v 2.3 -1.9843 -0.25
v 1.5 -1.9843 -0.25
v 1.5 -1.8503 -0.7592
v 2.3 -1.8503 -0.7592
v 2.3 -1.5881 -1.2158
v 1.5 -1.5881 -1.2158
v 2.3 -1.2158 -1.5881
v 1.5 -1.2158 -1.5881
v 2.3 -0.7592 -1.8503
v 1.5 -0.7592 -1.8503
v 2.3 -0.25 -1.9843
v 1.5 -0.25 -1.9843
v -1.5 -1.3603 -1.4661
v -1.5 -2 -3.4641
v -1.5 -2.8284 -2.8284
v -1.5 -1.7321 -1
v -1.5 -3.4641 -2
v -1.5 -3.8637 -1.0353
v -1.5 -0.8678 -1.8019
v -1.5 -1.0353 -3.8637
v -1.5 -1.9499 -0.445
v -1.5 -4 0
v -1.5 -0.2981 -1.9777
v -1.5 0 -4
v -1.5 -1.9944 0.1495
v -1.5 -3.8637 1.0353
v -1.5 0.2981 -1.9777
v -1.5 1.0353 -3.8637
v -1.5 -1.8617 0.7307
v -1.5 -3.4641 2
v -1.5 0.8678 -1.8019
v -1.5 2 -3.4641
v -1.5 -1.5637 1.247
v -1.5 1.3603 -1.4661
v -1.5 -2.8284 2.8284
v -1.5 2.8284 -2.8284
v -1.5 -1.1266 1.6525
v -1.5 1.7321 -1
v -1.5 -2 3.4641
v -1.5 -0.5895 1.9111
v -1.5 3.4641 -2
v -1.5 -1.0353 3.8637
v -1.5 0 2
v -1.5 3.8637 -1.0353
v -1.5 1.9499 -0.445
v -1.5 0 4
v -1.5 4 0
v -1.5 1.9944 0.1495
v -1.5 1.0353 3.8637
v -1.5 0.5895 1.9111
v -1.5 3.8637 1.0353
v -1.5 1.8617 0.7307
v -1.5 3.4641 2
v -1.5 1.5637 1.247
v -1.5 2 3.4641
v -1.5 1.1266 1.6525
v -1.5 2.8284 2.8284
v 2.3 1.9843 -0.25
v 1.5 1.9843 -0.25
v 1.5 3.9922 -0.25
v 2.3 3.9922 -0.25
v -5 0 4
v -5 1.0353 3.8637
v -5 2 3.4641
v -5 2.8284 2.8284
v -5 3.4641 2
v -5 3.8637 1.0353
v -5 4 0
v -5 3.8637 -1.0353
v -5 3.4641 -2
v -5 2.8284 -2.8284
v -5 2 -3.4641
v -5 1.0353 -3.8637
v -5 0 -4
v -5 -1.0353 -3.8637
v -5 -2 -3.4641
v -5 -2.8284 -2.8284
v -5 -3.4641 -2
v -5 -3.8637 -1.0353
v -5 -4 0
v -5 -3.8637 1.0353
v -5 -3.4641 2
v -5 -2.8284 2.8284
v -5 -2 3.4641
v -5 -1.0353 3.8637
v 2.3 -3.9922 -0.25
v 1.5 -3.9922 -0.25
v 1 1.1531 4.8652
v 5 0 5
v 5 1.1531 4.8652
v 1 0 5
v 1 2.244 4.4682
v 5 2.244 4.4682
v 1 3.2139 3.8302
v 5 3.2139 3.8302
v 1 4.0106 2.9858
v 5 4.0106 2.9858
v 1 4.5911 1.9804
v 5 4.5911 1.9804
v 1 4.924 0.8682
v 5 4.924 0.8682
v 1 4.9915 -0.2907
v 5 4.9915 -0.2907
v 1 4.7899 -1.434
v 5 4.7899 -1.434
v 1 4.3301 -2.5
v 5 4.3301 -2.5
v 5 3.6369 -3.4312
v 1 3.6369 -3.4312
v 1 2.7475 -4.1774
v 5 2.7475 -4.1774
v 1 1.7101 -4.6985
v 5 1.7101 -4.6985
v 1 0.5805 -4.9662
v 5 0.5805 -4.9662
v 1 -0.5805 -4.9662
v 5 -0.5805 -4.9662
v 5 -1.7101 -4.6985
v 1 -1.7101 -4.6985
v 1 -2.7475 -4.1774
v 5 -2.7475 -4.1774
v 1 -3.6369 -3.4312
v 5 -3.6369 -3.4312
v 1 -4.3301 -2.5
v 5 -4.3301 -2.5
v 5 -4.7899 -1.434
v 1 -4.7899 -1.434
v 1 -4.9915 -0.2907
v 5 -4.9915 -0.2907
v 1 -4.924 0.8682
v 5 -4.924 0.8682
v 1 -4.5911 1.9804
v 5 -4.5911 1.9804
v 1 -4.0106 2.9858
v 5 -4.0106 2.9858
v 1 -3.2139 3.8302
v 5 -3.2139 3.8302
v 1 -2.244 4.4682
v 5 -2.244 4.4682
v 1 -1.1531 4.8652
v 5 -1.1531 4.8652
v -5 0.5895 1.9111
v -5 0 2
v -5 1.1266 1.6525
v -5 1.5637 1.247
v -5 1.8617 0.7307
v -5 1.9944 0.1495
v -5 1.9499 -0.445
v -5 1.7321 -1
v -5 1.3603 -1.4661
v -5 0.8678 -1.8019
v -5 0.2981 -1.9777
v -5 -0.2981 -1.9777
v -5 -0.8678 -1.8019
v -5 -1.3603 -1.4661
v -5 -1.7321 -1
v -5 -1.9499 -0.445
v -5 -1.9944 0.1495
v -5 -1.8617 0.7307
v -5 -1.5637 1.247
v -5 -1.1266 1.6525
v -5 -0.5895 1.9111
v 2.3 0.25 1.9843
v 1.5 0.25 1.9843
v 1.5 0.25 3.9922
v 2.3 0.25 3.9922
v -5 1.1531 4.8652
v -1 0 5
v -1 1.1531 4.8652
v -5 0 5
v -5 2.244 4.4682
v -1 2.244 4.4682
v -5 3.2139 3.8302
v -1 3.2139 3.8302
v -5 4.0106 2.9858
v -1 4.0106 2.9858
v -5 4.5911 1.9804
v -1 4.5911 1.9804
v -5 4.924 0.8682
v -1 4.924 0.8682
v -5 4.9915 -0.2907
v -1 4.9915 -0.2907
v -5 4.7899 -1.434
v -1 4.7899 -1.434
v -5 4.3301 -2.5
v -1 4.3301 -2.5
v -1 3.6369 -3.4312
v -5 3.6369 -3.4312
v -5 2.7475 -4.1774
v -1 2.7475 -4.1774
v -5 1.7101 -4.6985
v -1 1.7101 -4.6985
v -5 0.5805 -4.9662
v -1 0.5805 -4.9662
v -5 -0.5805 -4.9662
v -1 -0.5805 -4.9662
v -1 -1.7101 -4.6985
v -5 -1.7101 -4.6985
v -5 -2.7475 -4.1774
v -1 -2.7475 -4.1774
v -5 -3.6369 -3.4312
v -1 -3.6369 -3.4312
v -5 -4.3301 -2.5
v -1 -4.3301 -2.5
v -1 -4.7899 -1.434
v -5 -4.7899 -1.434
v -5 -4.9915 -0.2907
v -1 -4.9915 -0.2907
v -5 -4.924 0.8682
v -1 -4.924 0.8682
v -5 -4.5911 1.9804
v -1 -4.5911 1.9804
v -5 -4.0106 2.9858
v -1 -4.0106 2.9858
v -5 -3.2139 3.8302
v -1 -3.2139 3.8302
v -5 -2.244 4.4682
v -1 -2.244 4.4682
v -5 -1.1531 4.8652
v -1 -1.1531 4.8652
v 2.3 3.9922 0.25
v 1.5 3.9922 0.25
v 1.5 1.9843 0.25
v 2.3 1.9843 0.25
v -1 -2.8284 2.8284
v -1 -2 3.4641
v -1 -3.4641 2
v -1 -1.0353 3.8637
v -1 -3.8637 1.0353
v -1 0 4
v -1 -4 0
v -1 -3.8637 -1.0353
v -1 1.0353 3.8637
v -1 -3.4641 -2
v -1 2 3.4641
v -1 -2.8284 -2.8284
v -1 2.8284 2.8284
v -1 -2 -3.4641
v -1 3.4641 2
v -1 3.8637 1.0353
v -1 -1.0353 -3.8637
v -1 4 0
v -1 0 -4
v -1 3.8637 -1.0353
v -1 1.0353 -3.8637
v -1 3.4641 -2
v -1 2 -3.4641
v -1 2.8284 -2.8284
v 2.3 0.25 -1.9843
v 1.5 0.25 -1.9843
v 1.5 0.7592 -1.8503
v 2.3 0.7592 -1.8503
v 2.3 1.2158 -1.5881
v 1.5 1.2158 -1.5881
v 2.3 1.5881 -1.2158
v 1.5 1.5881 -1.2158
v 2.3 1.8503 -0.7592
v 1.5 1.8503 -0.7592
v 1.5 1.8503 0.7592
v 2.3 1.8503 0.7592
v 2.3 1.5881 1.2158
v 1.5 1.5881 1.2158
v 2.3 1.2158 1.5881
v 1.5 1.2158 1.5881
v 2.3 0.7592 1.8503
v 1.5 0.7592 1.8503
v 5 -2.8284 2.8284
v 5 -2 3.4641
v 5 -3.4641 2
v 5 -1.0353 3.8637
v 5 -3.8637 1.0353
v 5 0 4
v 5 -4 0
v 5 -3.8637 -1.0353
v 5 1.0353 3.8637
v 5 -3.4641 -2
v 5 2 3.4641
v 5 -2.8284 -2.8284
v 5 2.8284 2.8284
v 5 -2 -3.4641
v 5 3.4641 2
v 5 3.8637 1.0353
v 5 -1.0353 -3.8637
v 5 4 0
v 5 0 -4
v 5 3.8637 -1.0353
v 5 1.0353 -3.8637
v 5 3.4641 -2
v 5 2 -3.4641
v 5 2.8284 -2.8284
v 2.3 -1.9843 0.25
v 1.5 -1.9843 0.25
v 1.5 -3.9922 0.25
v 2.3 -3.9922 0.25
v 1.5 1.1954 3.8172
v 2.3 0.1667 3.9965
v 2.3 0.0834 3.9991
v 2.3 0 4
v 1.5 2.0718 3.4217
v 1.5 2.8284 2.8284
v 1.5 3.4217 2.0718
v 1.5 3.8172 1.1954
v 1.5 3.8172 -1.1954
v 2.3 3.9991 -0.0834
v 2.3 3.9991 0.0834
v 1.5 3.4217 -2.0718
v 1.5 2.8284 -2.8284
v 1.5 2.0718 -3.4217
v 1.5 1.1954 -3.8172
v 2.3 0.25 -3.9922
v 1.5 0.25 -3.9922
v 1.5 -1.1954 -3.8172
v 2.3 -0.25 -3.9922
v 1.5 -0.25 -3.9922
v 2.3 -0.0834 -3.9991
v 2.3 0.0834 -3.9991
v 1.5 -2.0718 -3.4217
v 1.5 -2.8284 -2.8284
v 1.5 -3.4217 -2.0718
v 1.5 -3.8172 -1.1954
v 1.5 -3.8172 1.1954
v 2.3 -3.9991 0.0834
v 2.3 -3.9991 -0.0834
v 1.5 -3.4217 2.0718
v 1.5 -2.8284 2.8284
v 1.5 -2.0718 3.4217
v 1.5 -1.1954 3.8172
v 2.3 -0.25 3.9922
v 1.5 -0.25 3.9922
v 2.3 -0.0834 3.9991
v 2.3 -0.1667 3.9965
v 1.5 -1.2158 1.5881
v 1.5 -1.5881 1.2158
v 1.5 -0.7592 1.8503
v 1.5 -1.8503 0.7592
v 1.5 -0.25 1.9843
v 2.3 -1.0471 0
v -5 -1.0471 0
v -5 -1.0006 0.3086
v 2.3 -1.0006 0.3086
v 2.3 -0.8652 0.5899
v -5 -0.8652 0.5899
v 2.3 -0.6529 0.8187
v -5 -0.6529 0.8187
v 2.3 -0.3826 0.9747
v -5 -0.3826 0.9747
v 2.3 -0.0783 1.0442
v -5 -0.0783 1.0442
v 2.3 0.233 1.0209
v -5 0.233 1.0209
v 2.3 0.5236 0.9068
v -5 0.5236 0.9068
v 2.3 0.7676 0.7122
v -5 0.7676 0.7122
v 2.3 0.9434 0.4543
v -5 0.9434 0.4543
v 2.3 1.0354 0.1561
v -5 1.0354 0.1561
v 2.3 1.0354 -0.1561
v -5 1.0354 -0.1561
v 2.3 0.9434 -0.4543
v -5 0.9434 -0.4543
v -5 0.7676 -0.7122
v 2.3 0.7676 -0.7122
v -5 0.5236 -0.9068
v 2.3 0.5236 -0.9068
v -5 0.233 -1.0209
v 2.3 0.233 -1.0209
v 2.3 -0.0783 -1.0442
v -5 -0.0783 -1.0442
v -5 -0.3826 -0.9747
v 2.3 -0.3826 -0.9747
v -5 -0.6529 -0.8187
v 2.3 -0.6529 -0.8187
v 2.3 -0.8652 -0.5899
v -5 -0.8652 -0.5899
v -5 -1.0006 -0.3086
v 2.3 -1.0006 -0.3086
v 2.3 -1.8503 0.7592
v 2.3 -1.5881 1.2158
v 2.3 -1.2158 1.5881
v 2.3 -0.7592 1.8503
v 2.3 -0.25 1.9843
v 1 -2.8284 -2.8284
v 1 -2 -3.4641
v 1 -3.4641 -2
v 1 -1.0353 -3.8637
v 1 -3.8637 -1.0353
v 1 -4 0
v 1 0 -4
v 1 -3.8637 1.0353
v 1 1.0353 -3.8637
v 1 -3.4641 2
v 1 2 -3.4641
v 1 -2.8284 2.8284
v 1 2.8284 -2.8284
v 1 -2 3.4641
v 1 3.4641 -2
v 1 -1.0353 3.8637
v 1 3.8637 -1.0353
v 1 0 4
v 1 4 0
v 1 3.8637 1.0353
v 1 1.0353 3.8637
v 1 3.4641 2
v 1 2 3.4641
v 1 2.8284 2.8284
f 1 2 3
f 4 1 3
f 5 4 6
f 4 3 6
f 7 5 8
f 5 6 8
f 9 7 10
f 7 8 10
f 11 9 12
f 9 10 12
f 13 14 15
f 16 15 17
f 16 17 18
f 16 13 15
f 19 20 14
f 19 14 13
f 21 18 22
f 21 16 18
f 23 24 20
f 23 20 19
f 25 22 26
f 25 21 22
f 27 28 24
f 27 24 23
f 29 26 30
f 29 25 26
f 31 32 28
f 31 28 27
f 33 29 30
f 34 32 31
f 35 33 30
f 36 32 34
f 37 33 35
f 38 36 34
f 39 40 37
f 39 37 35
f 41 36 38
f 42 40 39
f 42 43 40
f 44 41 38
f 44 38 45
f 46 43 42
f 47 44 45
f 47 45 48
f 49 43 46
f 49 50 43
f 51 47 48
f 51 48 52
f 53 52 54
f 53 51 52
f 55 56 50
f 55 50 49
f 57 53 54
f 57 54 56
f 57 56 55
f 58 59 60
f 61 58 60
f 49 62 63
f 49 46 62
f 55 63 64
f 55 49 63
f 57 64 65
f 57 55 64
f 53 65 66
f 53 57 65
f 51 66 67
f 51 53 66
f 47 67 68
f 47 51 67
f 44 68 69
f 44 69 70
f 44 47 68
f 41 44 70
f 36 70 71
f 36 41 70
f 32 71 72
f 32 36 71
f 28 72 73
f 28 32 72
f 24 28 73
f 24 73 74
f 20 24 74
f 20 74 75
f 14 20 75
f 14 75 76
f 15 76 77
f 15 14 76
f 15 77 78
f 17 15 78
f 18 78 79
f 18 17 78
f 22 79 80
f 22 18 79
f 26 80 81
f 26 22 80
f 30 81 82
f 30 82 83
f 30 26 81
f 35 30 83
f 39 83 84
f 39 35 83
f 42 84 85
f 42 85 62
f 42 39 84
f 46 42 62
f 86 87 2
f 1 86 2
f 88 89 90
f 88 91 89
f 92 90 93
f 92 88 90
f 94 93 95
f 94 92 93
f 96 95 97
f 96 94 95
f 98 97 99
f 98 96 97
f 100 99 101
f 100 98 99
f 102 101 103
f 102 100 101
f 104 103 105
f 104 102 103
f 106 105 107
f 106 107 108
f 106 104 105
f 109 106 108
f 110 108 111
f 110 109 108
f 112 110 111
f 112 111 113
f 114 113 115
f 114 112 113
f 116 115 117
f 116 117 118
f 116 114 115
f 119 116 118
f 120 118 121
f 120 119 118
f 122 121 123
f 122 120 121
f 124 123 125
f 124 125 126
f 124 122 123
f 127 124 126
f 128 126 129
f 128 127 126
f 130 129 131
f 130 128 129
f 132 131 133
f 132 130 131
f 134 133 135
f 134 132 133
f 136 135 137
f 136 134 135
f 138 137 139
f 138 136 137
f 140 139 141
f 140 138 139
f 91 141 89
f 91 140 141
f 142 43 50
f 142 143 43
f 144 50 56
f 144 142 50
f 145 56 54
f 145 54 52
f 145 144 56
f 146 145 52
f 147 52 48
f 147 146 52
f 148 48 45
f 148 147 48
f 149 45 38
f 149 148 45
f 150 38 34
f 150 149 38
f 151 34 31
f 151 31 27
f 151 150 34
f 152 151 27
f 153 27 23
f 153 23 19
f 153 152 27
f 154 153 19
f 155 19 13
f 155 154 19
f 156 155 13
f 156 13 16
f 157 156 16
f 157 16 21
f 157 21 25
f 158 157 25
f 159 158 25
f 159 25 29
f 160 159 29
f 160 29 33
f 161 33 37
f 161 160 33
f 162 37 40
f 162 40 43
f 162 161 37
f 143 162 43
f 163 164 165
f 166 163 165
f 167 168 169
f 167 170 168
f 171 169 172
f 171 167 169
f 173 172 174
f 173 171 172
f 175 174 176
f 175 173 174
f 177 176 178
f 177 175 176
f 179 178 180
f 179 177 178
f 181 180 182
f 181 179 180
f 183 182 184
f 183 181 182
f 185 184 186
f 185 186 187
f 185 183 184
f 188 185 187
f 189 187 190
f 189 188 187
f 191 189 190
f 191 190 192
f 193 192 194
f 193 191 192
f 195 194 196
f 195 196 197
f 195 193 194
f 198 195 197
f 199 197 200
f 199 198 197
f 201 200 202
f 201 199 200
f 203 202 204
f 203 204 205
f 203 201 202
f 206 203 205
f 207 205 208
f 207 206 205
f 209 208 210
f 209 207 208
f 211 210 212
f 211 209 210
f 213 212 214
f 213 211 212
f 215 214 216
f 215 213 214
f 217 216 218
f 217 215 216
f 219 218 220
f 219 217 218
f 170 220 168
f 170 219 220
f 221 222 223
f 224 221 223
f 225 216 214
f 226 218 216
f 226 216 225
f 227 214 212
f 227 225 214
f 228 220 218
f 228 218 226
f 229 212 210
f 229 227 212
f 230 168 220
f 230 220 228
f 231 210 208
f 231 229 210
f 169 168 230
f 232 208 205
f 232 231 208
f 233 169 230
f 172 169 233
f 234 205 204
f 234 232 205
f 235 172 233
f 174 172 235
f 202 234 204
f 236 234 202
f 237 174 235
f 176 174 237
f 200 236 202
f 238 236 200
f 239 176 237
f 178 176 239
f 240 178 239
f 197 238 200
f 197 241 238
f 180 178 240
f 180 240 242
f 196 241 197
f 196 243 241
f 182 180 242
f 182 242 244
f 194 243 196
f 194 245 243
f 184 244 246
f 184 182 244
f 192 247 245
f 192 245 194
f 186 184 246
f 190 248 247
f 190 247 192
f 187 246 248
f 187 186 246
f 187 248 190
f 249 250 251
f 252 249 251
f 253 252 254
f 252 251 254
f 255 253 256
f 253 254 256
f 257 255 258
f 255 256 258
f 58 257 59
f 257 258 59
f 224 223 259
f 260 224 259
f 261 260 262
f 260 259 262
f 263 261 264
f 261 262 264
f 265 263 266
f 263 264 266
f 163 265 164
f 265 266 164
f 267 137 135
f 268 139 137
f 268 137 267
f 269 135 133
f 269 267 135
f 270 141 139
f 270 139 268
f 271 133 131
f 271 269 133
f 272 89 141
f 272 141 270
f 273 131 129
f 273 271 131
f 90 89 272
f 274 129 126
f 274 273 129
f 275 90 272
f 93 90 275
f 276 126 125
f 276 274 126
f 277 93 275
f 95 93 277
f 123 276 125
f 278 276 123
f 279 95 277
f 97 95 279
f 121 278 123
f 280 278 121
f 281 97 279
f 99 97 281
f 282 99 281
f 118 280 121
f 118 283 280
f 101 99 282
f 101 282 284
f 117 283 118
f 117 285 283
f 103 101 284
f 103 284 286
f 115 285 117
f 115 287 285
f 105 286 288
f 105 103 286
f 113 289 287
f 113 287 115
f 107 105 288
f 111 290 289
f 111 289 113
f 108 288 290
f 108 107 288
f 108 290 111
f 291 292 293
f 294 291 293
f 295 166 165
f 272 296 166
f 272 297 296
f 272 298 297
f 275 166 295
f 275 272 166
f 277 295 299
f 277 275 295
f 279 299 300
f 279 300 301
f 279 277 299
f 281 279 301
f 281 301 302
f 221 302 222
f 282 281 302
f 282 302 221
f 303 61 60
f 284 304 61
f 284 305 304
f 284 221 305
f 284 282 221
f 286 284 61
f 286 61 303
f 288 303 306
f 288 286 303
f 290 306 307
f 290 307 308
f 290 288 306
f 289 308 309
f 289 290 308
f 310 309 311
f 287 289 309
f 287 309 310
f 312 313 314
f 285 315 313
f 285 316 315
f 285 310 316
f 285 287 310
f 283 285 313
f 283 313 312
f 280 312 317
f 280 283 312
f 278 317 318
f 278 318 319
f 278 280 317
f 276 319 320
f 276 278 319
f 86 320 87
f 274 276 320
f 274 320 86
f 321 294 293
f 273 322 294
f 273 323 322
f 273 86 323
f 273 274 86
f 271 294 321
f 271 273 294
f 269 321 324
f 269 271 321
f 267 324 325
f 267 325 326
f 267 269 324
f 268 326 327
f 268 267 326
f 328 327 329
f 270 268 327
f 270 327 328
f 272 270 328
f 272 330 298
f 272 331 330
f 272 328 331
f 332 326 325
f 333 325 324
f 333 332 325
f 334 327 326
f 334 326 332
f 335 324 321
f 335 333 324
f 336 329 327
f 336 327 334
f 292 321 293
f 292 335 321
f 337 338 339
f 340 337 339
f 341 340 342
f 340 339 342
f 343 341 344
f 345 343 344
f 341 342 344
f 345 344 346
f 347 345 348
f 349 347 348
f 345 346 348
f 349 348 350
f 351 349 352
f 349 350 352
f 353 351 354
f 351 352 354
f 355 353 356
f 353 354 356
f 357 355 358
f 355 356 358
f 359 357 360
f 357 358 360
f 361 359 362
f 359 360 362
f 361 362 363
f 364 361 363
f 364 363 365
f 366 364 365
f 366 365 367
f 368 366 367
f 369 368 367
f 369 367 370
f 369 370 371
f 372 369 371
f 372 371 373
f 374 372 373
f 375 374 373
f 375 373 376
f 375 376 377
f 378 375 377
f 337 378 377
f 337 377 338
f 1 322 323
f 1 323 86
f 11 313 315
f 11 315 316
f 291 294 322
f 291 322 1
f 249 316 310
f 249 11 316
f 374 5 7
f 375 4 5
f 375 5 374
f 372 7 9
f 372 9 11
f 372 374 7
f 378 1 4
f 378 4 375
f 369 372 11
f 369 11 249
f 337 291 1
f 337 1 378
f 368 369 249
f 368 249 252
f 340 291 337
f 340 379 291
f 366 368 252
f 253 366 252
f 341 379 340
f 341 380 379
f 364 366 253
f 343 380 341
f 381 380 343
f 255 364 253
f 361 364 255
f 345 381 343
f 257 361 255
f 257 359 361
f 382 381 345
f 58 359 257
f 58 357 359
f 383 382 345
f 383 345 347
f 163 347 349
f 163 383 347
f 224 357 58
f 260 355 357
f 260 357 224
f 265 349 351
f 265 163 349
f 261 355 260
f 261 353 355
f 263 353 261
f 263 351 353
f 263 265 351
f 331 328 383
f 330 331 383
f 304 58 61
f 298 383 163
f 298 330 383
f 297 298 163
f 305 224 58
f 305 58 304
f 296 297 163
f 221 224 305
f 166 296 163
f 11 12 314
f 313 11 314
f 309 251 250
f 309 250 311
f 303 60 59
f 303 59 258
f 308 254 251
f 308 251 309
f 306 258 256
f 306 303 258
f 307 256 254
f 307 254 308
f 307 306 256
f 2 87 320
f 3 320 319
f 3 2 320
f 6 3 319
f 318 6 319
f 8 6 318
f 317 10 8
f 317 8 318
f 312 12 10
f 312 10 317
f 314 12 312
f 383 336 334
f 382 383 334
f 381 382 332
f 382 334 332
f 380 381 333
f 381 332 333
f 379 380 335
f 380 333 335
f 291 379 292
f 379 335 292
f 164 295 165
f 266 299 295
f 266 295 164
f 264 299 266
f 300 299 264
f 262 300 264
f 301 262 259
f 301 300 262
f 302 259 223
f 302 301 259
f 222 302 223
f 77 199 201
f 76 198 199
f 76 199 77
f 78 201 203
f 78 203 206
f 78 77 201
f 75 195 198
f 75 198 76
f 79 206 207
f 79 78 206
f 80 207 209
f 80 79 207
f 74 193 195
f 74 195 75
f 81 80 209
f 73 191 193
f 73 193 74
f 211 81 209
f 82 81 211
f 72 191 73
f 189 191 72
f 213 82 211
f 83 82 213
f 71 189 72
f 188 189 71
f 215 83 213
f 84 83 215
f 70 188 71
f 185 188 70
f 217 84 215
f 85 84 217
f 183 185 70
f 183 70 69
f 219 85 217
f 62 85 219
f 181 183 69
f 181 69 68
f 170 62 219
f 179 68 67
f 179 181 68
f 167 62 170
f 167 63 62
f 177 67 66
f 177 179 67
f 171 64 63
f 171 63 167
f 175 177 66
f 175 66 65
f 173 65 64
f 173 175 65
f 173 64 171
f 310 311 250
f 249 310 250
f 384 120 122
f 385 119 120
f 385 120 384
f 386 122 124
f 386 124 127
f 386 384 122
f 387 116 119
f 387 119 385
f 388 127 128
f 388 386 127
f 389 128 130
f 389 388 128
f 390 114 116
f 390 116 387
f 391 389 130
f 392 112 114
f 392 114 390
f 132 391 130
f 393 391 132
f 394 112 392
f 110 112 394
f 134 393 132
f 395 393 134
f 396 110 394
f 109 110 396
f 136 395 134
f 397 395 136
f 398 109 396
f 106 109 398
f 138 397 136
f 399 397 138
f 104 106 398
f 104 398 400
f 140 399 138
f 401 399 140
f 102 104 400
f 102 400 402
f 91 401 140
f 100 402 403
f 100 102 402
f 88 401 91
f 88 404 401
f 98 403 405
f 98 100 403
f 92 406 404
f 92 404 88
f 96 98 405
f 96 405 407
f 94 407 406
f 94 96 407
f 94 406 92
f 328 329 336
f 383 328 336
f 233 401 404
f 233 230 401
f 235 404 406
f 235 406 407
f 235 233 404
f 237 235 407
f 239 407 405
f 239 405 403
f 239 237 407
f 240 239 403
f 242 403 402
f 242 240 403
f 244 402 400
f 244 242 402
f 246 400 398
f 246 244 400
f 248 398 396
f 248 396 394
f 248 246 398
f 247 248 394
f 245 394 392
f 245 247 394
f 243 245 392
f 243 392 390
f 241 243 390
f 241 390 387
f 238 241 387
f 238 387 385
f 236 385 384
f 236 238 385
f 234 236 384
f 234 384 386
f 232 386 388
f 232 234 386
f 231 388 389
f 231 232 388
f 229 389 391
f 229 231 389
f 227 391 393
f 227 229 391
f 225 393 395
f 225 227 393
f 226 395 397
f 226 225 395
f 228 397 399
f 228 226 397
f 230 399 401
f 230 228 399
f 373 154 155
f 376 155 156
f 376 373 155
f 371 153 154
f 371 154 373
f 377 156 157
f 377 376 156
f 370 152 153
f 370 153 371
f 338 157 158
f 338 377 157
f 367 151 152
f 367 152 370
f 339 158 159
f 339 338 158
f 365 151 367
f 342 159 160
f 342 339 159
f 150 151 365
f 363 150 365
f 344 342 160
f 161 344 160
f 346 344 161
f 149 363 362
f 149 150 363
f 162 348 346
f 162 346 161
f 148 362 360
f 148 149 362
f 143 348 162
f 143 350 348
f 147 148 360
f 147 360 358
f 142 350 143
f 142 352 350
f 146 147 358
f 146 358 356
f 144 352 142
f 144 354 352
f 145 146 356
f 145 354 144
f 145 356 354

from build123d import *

# Parameters (mm, degrees)
F3_DEPTH = 20.32
F4_R     = 26.5969847408
F5_DEPTH = 254.001
F6_SCALE = 0.0393700787


with BuildPart() as f1:
    # F0 (on Front) → F1 (revolve)
    with BuildSketch(Plane.XZ):
        Polygon((-127, 0), (0, 0), (38.1, 0), (38.1, 50.8), (38.1, 76.2), (38.1, 101.6), (127, 101.6), (127, 127), (25.4, 127), (25.4, 101.6), (0, 101.6), (-25.4, 101.6), (-25.4, 127), (-127, 127), (-127, 101.6), (-38.1, 101.6), (-38.1, 76.2), (-38.1, 50.8), (-127, 50.8), (-127, 25.4), align=None)
    revolve(axis=Axis((-63.5, 0, 0), (-1, 0, 0)))

    # F2 (on face) → F3 (join)
    with BuildSketch(Plane.YZ.offset(38.1)):
        with BuildLine():
            ThreePointArc((50.4015624854, -6.3499999233), (50.7002927716, -3.1812439186), (50.8, 0))
            ThreePointArc((50.8, 0), (50.7002927716, 3.1812439186), (50.4015624854, 6.3499999233))
            ThreePointArc((50.4015624854, 6.3499999233), (35.9210244843, 35.9210244843), (6.3499999233, 50.4015624854))
            ThreePointArc((6.3499999233, 50.4015624854), (0, 50.8), (-6.3499999233, 50.4015624854))
            ThreePointArc((-6.3499999233, 50.4015624854), (-35.9210244843, 35.9210244843), (-50.4015624854, 6.3499999233))
            ThreePointArc((-50.4015624854, 6.3499999233), (-50.8, 0), (-50.4015624854, -6.3499999233))
            ThreePointArc((-50.4015624854, -6.3499999233), (-35.9210244843, -35.9210244843), (-6.3499999233, -50.4015624854))
            ThreePointArc((-6.3499999233, -50.4015624854), (0, -50.8), (6.3499999233, -50.4015624854))
            ThreePointArc((6.3499999233, -50.4015624854), (35.9210244843, -35.9210244843), (50.4015624854, -6.3499999233))
        make_face()
        with BuildLine():
            ThreePointArc((50.4015624854, 6.3499999233), (50.7002927716, 3.1812439186), (50.8, 0))
            ThreePointArc((50.8, 0), (50.7002927716, -3.1812439186), (50.4015624854, -6.3499999233))
            Line((50.4015624854, -6.3499999233), (101.4013683388, -6.3499999233))
            ThreePointArc((101.4013683388, -6.3499999233), (101.6, 0), (101.4013683388, 6.3499999233))
            Line((101.4013683388, 6.3499999233), (50.4015624854, 6.3499999233))
        make_face()
        with BuildLine():
            ThreePointArc((-6.3499999233, 50.4015624854), (0, 50.8), (6.3499999233, 50.4015624854))
            Line((6.3499999233, 50.4015624854), (6.3499999233, 101.4013683388))
            ThreePointArc((6.3499999233, 101.4013683388), (0, 101.6), (-6.3499999233, 101.4013683388))
            Line((-6.3499999233, 101.4013683388), (-6.3499999233, 50.4015624854))
        make_face()
        with BuildLine():
            Line((6.3499999233, -101.4013683388), (6.3499999233, -50.4015624854))
            ThreePointArc((6.3499999233, -50.4015624854), (0, -50.8), (-6.3499999233, -50.4015624854))
            Line((-6.3499999233, -50.4015624854), (-6.3499999233, -101.4013683388))
            ThreePointArc((-6.3499999233, -101.4013683388), (0, -101.6), (6.3499999233, -101.4013683388))
        make_face()
        with BuildLine():
            ThreePointArc((-50.4015624854, -6.3499999233), (-50.8, 0), (-50.4015624854, 6.3499999233))
            Line((-50.4015624854, 6.3499999233), (-101.4013683388, 6.3499999233))
            ThreePointArc((-101.4013683388, 6.3499999233), (-101.6, 0), (-101.4013683388, -6.3499999233))
            Line((-101.4013683388, -6.3499999233), (-50.4015624854, -6.3499999233))
        make_face()
    extrude(amount=F3_DEPTH)

    # F4 (on face) → F5 (cut, through all)
    with BuildSketch(Plane(origin=(-127, 0, 0), x_dir=(0, -1, 0), z_dir=(-1, 0, 0))):
        Circle(F4_R)
    extrude(amount=-F5_DEPTH, mode=Mode.SUBTRACT)


with BuildPart() as f1_1:
    # F6: moved
    add(f1.part.scale(F6_SCALE))


solid = f1_1.part
